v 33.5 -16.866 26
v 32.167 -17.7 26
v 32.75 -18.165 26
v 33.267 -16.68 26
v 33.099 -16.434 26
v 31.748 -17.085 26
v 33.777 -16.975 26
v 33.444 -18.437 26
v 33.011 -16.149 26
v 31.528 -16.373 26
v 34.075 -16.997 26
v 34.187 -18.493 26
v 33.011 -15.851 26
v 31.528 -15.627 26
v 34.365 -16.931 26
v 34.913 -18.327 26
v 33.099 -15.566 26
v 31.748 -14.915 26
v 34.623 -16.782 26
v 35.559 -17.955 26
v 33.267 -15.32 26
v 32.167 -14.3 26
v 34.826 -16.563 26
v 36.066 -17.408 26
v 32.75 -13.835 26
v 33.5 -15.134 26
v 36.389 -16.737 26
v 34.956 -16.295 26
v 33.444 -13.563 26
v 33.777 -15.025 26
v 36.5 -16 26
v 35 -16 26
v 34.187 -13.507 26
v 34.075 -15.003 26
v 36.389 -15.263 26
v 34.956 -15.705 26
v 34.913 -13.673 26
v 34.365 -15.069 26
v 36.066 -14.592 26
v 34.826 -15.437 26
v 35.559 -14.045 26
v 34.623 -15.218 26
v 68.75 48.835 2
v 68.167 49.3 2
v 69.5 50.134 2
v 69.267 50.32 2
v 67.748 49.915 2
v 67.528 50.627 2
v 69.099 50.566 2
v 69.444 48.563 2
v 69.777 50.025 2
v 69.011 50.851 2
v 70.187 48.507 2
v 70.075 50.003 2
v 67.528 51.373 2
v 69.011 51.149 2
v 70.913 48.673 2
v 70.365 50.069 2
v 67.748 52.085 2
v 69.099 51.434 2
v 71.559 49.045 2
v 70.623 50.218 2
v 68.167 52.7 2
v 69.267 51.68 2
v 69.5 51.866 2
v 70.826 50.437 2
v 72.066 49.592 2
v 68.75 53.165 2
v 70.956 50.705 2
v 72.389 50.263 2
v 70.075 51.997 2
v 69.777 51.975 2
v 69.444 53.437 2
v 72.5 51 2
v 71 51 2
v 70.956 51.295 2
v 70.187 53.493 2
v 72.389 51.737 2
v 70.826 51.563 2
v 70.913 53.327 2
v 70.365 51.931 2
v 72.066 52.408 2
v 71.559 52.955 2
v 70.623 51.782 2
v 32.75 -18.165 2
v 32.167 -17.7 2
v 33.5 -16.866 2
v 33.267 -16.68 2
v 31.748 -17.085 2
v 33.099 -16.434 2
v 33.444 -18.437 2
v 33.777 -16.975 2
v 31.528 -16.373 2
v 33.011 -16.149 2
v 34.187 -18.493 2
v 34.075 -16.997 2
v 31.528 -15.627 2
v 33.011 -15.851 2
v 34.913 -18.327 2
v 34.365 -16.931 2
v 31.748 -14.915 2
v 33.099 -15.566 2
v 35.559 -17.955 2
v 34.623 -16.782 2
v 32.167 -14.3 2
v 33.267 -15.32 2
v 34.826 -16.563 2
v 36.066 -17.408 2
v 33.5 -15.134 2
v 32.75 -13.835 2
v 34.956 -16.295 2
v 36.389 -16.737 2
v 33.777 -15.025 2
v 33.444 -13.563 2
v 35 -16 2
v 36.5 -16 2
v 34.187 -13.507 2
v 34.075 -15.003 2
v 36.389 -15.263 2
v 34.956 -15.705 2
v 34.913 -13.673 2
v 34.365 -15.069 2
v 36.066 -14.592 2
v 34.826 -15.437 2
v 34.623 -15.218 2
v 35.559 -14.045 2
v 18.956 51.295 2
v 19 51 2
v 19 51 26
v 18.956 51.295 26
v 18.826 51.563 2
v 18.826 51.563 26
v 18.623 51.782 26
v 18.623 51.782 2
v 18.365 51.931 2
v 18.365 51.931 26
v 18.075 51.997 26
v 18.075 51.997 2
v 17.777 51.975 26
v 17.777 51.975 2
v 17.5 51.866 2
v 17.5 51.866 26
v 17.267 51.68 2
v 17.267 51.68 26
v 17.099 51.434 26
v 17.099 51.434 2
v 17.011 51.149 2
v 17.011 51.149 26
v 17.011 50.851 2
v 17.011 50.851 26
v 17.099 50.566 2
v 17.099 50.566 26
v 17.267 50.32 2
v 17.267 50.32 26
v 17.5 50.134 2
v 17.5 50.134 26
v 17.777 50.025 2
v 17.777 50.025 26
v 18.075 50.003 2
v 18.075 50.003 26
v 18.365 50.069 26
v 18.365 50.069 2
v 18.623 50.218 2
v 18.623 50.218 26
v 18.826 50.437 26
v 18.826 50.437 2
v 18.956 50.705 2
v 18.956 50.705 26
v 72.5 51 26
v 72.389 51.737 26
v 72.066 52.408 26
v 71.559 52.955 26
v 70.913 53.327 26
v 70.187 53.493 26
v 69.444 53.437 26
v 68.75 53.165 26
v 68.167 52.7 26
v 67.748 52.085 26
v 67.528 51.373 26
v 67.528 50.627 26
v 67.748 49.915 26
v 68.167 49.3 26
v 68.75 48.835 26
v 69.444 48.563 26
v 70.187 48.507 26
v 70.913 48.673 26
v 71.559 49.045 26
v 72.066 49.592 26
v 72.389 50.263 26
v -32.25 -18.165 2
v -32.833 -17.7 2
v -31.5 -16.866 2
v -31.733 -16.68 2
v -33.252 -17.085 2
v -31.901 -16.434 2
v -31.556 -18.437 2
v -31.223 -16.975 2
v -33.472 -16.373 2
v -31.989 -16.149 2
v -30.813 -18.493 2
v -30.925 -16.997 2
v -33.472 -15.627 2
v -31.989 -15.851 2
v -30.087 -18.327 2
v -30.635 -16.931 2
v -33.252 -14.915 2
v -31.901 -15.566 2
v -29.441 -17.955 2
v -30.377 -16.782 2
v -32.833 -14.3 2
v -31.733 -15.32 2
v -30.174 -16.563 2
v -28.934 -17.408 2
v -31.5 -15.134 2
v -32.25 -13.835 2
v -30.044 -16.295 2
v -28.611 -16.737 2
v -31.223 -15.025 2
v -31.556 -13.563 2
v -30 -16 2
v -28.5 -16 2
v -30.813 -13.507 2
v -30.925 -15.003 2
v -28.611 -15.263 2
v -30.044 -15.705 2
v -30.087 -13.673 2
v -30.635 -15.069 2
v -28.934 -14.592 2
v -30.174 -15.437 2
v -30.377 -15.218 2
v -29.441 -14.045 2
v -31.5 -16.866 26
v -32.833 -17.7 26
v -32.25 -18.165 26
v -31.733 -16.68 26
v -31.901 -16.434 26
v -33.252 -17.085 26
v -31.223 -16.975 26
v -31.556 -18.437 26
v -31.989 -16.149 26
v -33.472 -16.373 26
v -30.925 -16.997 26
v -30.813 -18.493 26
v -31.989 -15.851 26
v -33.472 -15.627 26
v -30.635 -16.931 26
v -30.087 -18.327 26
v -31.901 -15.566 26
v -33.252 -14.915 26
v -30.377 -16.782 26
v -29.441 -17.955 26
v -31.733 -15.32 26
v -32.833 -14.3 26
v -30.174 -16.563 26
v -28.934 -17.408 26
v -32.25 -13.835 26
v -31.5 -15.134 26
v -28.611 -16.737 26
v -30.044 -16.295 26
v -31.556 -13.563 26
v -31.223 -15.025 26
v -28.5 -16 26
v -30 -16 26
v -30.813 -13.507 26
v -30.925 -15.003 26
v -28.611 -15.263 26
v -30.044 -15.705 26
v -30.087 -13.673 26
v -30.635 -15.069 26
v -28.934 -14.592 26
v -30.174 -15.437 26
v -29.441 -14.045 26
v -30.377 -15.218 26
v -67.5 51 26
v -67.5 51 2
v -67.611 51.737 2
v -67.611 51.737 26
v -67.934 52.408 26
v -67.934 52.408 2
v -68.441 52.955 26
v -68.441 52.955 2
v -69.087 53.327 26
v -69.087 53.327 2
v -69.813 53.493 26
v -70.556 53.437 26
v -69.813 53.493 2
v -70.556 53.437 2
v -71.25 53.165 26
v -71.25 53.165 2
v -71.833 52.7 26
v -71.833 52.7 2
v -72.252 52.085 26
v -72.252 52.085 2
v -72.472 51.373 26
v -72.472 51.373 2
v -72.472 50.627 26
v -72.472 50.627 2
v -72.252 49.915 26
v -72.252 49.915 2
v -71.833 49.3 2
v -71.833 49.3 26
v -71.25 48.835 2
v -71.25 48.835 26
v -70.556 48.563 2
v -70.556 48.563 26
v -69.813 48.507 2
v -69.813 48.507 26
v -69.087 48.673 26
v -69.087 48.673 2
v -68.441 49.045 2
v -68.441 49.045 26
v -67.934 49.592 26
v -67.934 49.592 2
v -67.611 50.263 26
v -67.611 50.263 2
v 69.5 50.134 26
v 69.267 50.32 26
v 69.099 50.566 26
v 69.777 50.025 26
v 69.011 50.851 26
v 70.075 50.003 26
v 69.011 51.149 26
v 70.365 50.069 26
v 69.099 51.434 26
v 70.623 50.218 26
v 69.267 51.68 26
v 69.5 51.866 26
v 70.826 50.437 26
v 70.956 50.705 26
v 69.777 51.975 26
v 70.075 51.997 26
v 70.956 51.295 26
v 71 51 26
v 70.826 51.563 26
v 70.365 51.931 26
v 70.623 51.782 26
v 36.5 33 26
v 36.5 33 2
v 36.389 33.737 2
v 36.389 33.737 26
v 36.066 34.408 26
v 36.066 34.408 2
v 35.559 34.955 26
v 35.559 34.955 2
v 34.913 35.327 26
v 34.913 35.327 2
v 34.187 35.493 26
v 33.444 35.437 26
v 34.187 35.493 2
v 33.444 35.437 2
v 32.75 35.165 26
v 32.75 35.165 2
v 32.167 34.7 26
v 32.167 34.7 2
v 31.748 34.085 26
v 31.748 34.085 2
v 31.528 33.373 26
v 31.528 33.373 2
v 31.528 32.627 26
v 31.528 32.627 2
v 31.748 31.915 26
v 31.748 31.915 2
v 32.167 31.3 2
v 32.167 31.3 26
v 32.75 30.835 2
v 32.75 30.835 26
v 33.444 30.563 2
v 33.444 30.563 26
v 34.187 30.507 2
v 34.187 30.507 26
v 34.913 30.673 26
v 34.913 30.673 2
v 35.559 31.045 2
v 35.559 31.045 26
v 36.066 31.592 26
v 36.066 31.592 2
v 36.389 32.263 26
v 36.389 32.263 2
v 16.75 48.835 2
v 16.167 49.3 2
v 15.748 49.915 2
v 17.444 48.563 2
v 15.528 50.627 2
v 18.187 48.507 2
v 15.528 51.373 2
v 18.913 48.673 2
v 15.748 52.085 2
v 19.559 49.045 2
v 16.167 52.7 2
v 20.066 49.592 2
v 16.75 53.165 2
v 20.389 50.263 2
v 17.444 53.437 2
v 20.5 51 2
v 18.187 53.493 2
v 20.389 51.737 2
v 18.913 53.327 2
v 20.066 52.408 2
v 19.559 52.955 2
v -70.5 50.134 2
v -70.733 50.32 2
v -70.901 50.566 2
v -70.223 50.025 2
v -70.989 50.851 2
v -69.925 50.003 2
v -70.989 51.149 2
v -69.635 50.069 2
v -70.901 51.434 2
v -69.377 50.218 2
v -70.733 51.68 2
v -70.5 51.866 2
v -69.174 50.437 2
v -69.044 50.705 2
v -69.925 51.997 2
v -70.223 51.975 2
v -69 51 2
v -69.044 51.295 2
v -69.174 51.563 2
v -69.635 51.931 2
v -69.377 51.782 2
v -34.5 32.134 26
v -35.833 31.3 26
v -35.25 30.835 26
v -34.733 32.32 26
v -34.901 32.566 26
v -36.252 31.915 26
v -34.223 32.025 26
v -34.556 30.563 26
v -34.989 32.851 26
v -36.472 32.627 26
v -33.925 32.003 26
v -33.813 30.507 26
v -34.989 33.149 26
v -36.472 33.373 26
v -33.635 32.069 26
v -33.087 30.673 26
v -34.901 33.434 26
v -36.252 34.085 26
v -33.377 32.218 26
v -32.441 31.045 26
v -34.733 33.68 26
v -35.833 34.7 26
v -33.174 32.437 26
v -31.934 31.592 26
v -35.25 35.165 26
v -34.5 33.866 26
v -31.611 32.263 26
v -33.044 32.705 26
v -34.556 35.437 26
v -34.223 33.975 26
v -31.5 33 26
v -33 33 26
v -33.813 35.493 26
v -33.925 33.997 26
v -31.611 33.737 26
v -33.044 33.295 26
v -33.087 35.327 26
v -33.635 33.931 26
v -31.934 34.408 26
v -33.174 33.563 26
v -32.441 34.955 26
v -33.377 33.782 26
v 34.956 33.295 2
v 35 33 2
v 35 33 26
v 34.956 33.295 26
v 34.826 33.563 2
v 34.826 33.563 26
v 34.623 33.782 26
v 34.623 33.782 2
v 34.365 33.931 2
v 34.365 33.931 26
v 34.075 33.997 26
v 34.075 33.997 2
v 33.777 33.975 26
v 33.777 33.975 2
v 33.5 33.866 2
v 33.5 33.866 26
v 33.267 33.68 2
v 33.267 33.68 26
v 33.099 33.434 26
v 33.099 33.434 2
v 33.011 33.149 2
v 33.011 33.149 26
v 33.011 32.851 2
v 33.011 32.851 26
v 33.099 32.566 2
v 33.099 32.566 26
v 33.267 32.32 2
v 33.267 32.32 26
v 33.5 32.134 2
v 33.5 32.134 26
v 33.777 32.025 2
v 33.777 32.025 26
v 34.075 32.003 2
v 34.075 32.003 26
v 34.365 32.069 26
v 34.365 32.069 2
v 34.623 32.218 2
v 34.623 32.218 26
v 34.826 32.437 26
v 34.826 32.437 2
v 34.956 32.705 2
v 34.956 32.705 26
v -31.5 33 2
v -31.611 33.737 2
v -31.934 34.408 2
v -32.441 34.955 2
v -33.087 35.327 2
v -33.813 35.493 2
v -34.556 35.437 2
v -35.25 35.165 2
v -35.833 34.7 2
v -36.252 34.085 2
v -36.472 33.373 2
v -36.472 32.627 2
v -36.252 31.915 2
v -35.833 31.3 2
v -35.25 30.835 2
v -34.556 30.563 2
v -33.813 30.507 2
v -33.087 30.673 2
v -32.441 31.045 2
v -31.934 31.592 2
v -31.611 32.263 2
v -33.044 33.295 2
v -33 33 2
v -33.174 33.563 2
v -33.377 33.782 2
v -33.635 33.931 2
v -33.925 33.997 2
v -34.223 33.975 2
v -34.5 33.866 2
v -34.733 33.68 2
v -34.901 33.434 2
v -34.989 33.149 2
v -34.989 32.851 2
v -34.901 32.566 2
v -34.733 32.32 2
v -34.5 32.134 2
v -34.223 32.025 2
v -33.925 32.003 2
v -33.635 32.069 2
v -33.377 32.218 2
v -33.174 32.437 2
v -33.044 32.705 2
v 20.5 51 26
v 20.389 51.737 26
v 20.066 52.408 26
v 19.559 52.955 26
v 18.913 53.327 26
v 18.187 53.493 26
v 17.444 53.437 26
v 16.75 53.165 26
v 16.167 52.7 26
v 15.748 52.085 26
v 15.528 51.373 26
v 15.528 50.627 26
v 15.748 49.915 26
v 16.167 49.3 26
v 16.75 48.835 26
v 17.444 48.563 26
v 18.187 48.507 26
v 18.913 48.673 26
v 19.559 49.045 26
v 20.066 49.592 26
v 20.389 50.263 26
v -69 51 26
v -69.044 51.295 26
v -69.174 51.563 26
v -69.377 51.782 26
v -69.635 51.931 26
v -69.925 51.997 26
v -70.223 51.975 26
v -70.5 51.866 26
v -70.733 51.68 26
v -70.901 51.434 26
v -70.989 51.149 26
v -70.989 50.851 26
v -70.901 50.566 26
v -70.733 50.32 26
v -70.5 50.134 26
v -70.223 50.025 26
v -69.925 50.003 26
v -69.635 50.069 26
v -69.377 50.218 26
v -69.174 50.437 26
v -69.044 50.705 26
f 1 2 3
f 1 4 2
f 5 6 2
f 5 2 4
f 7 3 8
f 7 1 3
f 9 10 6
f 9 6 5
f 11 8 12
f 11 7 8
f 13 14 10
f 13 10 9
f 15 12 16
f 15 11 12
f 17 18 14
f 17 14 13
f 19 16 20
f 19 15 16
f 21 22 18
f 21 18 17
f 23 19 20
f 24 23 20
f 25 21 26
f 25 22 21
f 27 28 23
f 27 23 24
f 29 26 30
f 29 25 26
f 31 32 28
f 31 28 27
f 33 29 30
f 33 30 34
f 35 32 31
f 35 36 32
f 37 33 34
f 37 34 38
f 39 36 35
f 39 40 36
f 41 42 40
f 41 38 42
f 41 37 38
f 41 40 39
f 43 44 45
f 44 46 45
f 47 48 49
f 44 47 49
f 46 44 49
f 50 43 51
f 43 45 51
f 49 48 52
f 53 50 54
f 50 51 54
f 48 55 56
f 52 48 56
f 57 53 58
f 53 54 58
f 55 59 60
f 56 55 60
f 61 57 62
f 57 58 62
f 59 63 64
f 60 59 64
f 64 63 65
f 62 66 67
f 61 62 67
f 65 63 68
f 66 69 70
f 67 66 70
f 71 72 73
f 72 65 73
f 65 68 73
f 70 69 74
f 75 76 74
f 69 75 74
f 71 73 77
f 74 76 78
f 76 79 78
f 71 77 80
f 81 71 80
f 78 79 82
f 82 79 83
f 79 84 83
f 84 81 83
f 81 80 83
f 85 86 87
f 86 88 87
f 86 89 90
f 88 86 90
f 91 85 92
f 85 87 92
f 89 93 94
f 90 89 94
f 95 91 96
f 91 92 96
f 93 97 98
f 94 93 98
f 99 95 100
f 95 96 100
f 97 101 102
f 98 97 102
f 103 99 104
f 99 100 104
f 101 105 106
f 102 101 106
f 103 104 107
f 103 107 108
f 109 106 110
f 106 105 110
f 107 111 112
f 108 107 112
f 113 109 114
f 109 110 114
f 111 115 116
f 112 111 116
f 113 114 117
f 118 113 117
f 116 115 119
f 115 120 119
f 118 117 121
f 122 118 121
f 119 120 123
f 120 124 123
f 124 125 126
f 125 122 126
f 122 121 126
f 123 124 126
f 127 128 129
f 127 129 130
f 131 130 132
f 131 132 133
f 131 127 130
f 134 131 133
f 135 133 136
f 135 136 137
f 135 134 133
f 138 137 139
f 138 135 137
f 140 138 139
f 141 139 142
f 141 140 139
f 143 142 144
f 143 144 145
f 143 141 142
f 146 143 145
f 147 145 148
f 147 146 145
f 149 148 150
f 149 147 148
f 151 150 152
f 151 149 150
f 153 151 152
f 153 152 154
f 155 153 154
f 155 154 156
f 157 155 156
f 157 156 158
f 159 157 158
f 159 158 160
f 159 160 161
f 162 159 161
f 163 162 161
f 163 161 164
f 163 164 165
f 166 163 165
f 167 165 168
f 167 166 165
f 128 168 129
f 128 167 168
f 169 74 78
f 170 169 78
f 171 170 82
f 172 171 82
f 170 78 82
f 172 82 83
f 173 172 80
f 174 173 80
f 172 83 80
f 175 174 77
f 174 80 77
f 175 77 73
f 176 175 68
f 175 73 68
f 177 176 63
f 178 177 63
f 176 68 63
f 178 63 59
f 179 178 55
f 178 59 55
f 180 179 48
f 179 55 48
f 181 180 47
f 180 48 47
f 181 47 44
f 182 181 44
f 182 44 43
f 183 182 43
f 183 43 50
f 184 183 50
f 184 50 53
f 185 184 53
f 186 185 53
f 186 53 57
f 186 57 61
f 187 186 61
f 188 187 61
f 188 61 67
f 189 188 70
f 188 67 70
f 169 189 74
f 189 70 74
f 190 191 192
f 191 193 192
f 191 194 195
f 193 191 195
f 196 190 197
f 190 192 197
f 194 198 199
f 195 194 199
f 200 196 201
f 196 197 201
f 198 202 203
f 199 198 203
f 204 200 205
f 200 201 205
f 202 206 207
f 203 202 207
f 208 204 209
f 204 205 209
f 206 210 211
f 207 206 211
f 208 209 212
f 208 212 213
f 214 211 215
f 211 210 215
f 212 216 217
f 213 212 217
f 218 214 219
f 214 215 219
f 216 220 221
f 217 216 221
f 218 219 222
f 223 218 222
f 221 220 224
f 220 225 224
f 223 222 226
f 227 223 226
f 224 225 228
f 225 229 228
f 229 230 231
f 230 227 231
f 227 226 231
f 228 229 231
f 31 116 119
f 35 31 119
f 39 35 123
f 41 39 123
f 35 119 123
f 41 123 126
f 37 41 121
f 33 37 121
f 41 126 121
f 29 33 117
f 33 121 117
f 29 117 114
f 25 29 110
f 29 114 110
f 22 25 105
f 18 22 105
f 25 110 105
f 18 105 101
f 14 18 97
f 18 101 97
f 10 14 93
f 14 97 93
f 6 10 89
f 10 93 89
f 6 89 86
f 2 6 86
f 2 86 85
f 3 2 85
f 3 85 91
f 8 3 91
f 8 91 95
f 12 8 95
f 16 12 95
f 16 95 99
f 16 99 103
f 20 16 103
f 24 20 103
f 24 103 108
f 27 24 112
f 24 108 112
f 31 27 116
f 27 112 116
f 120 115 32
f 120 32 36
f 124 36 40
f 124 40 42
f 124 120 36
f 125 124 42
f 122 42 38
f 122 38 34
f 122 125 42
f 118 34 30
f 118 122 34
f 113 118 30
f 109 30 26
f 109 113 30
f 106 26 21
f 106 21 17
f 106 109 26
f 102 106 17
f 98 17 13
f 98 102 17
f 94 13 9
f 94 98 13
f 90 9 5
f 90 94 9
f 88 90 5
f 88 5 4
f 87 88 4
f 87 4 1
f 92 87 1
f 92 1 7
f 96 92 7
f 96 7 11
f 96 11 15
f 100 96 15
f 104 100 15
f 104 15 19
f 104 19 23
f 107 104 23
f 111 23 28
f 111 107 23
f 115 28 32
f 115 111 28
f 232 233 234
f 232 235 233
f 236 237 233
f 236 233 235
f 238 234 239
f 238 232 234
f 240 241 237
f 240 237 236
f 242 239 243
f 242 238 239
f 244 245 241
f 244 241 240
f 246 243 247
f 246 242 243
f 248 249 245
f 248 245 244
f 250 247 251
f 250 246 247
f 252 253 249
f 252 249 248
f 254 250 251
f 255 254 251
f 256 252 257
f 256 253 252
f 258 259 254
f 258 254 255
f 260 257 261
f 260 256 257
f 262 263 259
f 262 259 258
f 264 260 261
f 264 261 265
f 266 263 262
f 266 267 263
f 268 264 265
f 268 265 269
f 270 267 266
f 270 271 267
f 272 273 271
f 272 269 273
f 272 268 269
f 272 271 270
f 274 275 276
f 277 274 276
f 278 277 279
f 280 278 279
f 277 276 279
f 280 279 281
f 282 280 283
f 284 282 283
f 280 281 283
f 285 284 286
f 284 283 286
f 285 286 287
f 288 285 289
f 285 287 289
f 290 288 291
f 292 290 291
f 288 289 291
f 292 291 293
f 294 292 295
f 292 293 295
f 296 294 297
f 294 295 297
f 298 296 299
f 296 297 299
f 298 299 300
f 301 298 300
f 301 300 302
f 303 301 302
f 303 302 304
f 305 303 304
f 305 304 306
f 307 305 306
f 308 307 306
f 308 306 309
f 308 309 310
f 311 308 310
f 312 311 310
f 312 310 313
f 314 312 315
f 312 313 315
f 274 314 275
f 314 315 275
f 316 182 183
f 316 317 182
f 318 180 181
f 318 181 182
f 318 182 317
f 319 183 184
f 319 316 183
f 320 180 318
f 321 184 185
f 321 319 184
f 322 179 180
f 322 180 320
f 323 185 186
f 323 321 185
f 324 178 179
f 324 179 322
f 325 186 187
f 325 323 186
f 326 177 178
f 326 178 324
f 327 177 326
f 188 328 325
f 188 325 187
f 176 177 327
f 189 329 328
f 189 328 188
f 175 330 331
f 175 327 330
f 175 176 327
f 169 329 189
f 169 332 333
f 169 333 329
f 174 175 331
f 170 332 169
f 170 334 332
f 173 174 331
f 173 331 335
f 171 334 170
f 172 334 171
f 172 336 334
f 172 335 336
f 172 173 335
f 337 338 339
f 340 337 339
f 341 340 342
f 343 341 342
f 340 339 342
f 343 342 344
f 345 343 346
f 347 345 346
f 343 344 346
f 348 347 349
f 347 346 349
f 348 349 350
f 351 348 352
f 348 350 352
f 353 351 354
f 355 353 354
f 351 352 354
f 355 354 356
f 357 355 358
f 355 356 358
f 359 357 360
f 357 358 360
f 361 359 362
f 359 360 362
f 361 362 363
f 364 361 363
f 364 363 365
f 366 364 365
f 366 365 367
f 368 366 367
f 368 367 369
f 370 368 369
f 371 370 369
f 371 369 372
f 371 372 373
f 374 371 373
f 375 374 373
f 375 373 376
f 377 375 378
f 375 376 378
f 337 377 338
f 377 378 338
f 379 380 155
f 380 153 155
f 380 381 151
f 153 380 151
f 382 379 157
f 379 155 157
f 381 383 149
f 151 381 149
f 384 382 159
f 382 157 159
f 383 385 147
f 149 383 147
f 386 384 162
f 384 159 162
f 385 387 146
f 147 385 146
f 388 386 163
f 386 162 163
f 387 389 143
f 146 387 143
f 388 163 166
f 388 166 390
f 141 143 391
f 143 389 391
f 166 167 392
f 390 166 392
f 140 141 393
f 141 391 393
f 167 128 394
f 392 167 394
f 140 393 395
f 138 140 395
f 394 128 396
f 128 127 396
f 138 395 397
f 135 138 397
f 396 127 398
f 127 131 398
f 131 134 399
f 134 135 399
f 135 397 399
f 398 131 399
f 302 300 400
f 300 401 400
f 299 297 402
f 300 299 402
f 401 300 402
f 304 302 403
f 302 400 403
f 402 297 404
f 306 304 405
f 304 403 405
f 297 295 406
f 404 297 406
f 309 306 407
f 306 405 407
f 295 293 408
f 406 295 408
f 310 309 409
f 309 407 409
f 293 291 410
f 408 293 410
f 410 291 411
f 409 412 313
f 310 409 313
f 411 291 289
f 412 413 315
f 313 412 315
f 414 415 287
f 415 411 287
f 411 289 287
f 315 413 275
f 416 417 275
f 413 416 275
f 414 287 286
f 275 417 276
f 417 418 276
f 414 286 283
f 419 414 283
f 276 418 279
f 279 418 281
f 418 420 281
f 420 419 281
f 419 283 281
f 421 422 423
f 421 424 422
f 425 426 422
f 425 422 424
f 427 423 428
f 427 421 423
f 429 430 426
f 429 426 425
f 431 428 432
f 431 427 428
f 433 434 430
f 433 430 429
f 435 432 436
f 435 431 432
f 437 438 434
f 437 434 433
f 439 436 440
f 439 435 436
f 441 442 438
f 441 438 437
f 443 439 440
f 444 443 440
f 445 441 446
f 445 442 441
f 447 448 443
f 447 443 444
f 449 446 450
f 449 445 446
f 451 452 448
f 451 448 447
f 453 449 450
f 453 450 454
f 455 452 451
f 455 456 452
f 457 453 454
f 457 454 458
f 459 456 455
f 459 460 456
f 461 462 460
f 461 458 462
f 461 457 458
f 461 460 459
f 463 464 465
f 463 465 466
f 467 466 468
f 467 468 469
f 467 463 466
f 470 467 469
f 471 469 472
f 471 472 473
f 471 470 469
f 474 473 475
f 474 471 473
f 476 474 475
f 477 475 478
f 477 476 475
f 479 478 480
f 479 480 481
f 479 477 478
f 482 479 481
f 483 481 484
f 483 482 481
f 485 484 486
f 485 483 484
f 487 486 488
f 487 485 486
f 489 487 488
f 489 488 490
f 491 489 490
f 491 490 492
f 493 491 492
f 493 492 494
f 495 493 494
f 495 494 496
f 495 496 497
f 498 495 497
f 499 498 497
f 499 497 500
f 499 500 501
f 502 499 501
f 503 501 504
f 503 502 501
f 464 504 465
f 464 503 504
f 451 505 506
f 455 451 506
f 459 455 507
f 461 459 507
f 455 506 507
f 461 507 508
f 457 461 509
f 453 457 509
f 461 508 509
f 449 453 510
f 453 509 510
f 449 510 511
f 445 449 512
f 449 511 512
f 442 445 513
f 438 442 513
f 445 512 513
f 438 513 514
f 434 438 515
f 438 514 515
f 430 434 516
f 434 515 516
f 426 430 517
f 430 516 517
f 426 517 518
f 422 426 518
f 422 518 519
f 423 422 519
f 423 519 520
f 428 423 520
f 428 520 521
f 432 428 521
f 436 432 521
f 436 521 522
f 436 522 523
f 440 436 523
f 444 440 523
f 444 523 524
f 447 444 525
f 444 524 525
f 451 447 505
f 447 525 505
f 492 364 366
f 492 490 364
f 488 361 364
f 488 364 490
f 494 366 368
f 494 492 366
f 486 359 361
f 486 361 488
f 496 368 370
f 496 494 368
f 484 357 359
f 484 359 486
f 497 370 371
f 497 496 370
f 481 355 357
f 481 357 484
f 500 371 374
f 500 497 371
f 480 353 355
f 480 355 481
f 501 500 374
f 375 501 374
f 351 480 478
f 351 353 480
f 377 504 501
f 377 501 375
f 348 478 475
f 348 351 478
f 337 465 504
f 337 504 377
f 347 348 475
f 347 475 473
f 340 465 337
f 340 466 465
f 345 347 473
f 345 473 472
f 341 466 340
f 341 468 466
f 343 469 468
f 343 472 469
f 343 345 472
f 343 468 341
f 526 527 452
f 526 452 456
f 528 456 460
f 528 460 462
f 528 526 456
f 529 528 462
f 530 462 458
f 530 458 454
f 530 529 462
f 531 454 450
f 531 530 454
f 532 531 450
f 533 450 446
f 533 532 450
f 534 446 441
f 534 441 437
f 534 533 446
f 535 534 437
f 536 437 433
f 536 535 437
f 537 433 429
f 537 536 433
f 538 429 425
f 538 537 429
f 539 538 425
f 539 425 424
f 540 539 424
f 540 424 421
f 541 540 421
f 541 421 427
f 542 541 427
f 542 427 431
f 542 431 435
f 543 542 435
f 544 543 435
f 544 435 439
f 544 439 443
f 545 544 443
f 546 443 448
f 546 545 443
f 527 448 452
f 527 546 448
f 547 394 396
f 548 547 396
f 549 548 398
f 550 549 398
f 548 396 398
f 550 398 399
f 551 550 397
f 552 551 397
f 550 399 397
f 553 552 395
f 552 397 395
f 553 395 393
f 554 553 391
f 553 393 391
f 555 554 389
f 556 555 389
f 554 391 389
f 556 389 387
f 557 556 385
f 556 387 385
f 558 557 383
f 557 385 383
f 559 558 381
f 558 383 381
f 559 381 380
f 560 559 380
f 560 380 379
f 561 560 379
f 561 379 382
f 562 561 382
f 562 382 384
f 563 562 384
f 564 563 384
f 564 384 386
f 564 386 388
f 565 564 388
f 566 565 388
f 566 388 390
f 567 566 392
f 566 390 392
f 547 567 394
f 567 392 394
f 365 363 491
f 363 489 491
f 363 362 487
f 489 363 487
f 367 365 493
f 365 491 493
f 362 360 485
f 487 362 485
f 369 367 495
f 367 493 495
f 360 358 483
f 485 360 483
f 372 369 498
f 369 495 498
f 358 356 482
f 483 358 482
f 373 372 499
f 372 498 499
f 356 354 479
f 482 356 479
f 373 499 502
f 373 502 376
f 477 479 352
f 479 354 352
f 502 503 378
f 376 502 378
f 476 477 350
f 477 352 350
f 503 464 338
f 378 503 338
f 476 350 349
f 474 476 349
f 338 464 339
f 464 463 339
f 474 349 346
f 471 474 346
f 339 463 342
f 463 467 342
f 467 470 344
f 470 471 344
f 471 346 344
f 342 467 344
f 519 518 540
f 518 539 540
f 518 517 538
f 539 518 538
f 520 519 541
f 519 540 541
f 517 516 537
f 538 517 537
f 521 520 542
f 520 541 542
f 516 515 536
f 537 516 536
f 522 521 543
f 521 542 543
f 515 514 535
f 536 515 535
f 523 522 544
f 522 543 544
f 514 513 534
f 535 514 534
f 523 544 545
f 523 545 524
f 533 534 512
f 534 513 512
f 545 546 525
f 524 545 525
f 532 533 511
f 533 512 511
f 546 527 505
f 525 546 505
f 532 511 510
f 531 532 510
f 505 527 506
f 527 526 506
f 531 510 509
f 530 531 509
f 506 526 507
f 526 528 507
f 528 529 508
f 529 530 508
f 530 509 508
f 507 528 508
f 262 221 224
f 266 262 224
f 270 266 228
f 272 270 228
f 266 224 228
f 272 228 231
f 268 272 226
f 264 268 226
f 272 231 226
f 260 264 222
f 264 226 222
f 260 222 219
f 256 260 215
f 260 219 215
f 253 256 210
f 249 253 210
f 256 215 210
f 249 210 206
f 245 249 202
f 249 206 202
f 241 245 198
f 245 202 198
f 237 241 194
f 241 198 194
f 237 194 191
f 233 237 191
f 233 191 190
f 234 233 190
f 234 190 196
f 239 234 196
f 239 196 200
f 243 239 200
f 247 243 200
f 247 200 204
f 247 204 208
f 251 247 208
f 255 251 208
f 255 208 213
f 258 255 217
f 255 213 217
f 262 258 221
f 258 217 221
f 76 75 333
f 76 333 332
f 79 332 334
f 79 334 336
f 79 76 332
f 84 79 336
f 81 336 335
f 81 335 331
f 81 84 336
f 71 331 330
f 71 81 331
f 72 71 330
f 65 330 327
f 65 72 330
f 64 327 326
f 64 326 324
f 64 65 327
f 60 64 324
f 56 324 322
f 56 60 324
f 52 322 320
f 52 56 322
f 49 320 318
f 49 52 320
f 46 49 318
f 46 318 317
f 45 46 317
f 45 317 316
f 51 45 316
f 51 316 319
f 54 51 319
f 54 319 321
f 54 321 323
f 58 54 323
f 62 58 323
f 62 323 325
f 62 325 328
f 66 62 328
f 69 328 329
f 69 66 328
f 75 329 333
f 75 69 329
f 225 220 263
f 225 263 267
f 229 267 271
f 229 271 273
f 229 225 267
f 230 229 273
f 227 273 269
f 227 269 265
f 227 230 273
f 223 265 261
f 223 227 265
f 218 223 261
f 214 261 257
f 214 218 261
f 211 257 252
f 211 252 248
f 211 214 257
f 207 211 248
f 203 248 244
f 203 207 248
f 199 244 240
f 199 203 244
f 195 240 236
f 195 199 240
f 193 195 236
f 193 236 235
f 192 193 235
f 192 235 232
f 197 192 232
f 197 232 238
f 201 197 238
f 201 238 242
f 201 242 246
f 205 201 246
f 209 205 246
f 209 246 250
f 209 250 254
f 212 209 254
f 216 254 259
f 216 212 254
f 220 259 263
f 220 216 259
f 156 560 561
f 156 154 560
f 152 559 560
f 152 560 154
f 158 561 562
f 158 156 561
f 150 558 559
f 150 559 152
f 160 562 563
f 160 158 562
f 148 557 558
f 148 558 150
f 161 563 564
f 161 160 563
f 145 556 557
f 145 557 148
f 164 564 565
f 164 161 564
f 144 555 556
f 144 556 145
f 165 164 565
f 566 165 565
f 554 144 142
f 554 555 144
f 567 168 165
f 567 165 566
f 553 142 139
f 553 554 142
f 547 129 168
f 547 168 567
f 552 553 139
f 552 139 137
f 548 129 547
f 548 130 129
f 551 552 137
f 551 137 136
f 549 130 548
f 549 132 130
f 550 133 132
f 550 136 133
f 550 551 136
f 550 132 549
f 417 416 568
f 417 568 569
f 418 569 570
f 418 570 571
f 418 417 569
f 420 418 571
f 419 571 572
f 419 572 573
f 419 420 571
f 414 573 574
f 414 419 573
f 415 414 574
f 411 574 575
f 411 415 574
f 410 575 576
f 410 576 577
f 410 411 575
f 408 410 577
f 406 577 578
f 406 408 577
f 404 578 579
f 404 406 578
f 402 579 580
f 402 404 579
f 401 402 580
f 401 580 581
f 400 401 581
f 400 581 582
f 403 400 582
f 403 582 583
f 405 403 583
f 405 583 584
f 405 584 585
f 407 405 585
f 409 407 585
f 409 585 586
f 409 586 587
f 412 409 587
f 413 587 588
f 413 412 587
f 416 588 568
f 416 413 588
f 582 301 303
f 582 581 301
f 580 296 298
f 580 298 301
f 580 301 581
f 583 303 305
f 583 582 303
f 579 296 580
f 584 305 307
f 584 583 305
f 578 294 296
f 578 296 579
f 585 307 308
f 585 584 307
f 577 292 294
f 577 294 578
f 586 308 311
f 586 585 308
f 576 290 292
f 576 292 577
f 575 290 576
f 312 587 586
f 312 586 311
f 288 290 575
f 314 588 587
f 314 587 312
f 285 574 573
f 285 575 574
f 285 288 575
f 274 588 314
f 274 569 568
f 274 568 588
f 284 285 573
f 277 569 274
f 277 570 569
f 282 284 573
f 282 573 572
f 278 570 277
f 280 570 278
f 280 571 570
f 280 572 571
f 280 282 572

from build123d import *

# Parameters (mm, degrees)
TUBE_R        = 2.5
TUBE_R_2      = 1
TUBE_DEPTH    = 24
TUBE001_R     = 2.5
TUBE001_R_2   = 1
TUBE001_DEPTH = 24
TUBE002_R     = 2.5
TUBE002_R_2   = 1
TUBE002_DEPTH = 24
TUBE003_R     = 2.5
TUBE003_R_2   = 1
TUBE003_DEPTH = 24
TUBE004_R     = 2.5
TUBE004_R_2   = 1
TUBE004_DEPTH = 24
TUBE005_R     = 2.5
TUBE005_R_2   = 1
TUBE005_DEPTH = 24
TUBE006_R     = 2.5
TUBE006_R_2   = 1
TUBE006_DEPTH = 24


with BuildPart() as tube:
    # Tube → Tube (new body)
    with BuildSketch(Plane(origin=(34, -16, 2), x_dir=(1, 0, 0), z_dir=(0, 0, 1))):
        Circle(TUBE_R)
        Circle(TUBE_R_2, mode=Mode.SUBTRACT)
    extrude(amount=TUBE_DEPTH)


with BuildPart() as tube001:
    # Tube001 → Tube001 (new body)
    with BuildSketch(Plane(origin=(-31, -16, 2), x_dir=(1, 0, 0), z_dir=(0, 0, 1))):
        Circle(TUBE001_R)
        Circle(TUBE001_R_2, mode=Mode.SUBTRACT)
    extrude(amount=TUBE001_DEPTH)


with BuildPart() as tube002:
    # Tube002 → Tube002 (new body)
    with BuildSketch(Plane(origin=(34, 33, 2), x_dir=(1, 0, 0), z_dir=(0, 0, 1))):
        Circle(TUBE002_R)
        Circle(TUBE002_R_2, mode=Mode.SUBTRACT)
    extrude(amount=TUBE002_DEPTH)


with BuildPart() as tube003:
    # Tube003 → Tube003 (new body)
    with BuildSketch(Plane(origin=(-34, 33, 2), x_dir=(1, 0, 0), z_dir=(0, 0, 1))):
        Circle(TUBE003_R)
        Circle(TUBE003_R_2, mode=Mode.SUBTRACT)
    extrude(amount=TUBE003_DEPTH)


with BuildPart() as tube004:
    # Tube004 → Tube004 (new body)
    with BuildSketch(Plane(origin=(70, 51, 2), x_dir=(1, 0, 0), z_dir=(0, 0, 1))):
        Circle(TUBE004_R)
        Circle(TUBE004_R_2, mode=Mode.SUBTRACT)
    extrude(amount=TUBE004_DEPTH)


with BuildPart() as tube005:
    # Tube005 → Tube005 (new body)
    with BuildSketch(Plane(origin=(-70, 51, 2), x_dir=(1, 0, 0), z_dir=(0, 0, 1))):
        Circle(TUBE005_R)
        Circle(TUBE005_R_2, mode=Mode.SUBTRACT)
    extrude(amount=TUBE005_DEPTH)


with BuildPart() as tornillos:
    # Tube006 → Tube006 (new body)
    with BuildSketch(Plane(origin=(18, 51, 2), x_dir=(1, 0, 0), z_dir=(0, 0, 1))):
        Circle(TUBE006_R)
        Circle(TUBE006_R_2, mode=Mode.SUBTRACT)
    extrude(amount=TUBE006_DEPTH)

    # Fusion023: union Tube, Tube001, Tube002, Tube003, Tube004, Tube005
    add(tube.part)
    add(tube001.part)
    add(tube002.part)
    add(tube003.part)
    add(tube004.part)
    add(tube005.part)


solid = tornillos.part
